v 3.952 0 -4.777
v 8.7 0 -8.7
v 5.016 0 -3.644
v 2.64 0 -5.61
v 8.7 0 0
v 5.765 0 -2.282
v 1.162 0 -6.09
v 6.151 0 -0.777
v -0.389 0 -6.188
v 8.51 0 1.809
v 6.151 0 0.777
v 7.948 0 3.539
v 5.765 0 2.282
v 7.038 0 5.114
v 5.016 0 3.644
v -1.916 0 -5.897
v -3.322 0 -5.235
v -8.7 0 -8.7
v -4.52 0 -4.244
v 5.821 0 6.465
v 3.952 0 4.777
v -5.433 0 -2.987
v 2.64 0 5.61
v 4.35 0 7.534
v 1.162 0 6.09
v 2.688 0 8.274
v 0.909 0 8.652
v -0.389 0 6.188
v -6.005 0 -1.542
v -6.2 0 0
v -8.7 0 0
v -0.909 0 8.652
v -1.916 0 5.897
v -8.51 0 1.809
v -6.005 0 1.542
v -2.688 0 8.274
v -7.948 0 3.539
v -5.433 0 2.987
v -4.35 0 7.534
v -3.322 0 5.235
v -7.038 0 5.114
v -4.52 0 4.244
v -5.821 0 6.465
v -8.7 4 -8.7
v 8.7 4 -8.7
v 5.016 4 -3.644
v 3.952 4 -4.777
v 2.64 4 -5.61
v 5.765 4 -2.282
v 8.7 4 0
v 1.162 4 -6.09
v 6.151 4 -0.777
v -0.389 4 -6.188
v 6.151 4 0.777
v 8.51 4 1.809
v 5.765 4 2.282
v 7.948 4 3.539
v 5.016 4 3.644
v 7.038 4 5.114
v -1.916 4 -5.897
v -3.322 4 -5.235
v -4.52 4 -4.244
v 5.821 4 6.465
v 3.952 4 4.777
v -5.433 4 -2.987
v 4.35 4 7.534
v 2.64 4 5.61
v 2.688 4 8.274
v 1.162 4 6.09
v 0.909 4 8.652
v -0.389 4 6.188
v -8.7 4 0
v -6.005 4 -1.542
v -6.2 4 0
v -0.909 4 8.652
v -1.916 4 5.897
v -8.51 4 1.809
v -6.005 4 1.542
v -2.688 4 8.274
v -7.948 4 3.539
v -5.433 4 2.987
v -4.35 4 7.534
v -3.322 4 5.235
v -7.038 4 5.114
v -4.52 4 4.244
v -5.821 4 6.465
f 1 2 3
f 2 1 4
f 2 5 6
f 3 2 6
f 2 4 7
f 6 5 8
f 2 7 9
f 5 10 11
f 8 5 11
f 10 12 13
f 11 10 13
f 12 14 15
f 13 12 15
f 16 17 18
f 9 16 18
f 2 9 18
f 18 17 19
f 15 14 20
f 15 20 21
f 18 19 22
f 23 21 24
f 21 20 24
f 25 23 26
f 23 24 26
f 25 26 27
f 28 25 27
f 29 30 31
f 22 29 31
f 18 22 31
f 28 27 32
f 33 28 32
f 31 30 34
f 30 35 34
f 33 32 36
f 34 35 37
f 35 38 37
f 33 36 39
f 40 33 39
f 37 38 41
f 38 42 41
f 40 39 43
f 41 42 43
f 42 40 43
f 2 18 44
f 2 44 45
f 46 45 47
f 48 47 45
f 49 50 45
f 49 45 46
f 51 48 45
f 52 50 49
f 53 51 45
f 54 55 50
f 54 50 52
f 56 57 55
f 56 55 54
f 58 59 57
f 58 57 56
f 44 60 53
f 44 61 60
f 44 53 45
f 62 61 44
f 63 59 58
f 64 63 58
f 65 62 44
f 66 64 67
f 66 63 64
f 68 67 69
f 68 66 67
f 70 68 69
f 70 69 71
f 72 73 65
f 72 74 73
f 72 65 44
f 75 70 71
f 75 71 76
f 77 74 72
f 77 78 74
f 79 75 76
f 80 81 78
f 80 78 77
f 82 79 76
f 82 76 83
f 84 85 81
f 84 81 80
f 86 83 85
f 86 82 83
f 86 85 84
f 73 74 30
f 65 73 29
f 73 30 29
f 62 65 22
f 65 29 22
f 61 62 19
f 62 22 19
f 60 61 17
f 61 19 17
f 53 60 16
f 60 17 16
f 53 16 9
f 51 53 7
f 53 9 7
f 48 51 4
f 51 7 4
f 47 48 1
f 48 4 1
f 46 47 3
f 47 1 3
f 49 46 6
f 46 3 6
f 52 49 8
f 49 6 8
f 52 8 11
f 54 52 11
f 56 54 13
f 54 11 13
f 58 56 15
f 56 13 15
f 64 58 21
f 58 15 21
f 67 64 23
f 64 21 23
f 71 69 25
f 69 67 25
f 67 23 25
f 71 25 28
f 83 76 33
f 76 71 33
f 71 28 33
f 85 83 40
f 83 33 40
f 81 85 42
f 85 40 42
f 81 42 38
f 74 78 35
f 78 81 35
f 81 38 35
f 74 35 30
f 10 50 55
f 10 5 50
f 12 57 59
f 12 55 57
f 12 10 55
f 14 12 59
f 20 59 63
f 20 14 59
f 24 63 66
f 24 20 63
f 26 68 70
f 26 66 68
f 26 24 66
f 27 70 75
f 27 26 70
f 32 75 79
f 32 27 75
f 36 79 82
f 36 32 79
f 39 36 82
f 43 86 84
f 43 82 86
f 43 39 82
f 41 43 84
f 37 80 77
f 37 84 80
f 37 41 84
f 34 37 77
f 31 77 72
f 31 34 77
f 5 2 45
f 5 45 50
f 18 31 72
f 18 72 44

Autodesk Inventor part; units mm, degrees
ref_plane "YZ Plane" through (0, 0, 0) normal (1, 0, 0) x (0, 1, 0)
ref_plane "XZ Plane" through (0, 0, 0) normal (0, 1, 0) x (-1, 0, 0)
ref_plane "XY Plane" through (0, 0, 0) normal (0, 0, 1) x (1, 0, 0)
sketch "Sketch1" plane through (0, 0, 0) normal (0, 1, 0) x (-1, 0, 0)
  circle A0 centre (0, 0) radius 2
  circle A1 centre (0, 0) radius 6.2
  circle A2 centre (0, 0) radius 8.7
  line L0 (12.18, 0) -> (-12.18, 0) projected
  line L1 (0, -12.18) -> (0, 12.18) projected
  line L2 (8.7, 0) -> (8.7, -8.7)
  line L3 (8.7, -8.7) -> (-8.7, -8.7)
  line L4 (-8.7, -8.7) -> (-8.7, 0)
  dimension "d0" = 4
  dimension "d1" = 12.4
  dimension "d2" = 17.4
  dimension "d3" = 17.4
extrude "Extrusion1" add sketch "Sketch1" along normal blind 4 contours L0 A2 L1 A1 | A1 L1 A2 L0 | A1 L0 A2 L1 | L1 A2 L0 A1 | L2 L3 A2 | L3 L4 A2
properties part number "borde al borde chico"
